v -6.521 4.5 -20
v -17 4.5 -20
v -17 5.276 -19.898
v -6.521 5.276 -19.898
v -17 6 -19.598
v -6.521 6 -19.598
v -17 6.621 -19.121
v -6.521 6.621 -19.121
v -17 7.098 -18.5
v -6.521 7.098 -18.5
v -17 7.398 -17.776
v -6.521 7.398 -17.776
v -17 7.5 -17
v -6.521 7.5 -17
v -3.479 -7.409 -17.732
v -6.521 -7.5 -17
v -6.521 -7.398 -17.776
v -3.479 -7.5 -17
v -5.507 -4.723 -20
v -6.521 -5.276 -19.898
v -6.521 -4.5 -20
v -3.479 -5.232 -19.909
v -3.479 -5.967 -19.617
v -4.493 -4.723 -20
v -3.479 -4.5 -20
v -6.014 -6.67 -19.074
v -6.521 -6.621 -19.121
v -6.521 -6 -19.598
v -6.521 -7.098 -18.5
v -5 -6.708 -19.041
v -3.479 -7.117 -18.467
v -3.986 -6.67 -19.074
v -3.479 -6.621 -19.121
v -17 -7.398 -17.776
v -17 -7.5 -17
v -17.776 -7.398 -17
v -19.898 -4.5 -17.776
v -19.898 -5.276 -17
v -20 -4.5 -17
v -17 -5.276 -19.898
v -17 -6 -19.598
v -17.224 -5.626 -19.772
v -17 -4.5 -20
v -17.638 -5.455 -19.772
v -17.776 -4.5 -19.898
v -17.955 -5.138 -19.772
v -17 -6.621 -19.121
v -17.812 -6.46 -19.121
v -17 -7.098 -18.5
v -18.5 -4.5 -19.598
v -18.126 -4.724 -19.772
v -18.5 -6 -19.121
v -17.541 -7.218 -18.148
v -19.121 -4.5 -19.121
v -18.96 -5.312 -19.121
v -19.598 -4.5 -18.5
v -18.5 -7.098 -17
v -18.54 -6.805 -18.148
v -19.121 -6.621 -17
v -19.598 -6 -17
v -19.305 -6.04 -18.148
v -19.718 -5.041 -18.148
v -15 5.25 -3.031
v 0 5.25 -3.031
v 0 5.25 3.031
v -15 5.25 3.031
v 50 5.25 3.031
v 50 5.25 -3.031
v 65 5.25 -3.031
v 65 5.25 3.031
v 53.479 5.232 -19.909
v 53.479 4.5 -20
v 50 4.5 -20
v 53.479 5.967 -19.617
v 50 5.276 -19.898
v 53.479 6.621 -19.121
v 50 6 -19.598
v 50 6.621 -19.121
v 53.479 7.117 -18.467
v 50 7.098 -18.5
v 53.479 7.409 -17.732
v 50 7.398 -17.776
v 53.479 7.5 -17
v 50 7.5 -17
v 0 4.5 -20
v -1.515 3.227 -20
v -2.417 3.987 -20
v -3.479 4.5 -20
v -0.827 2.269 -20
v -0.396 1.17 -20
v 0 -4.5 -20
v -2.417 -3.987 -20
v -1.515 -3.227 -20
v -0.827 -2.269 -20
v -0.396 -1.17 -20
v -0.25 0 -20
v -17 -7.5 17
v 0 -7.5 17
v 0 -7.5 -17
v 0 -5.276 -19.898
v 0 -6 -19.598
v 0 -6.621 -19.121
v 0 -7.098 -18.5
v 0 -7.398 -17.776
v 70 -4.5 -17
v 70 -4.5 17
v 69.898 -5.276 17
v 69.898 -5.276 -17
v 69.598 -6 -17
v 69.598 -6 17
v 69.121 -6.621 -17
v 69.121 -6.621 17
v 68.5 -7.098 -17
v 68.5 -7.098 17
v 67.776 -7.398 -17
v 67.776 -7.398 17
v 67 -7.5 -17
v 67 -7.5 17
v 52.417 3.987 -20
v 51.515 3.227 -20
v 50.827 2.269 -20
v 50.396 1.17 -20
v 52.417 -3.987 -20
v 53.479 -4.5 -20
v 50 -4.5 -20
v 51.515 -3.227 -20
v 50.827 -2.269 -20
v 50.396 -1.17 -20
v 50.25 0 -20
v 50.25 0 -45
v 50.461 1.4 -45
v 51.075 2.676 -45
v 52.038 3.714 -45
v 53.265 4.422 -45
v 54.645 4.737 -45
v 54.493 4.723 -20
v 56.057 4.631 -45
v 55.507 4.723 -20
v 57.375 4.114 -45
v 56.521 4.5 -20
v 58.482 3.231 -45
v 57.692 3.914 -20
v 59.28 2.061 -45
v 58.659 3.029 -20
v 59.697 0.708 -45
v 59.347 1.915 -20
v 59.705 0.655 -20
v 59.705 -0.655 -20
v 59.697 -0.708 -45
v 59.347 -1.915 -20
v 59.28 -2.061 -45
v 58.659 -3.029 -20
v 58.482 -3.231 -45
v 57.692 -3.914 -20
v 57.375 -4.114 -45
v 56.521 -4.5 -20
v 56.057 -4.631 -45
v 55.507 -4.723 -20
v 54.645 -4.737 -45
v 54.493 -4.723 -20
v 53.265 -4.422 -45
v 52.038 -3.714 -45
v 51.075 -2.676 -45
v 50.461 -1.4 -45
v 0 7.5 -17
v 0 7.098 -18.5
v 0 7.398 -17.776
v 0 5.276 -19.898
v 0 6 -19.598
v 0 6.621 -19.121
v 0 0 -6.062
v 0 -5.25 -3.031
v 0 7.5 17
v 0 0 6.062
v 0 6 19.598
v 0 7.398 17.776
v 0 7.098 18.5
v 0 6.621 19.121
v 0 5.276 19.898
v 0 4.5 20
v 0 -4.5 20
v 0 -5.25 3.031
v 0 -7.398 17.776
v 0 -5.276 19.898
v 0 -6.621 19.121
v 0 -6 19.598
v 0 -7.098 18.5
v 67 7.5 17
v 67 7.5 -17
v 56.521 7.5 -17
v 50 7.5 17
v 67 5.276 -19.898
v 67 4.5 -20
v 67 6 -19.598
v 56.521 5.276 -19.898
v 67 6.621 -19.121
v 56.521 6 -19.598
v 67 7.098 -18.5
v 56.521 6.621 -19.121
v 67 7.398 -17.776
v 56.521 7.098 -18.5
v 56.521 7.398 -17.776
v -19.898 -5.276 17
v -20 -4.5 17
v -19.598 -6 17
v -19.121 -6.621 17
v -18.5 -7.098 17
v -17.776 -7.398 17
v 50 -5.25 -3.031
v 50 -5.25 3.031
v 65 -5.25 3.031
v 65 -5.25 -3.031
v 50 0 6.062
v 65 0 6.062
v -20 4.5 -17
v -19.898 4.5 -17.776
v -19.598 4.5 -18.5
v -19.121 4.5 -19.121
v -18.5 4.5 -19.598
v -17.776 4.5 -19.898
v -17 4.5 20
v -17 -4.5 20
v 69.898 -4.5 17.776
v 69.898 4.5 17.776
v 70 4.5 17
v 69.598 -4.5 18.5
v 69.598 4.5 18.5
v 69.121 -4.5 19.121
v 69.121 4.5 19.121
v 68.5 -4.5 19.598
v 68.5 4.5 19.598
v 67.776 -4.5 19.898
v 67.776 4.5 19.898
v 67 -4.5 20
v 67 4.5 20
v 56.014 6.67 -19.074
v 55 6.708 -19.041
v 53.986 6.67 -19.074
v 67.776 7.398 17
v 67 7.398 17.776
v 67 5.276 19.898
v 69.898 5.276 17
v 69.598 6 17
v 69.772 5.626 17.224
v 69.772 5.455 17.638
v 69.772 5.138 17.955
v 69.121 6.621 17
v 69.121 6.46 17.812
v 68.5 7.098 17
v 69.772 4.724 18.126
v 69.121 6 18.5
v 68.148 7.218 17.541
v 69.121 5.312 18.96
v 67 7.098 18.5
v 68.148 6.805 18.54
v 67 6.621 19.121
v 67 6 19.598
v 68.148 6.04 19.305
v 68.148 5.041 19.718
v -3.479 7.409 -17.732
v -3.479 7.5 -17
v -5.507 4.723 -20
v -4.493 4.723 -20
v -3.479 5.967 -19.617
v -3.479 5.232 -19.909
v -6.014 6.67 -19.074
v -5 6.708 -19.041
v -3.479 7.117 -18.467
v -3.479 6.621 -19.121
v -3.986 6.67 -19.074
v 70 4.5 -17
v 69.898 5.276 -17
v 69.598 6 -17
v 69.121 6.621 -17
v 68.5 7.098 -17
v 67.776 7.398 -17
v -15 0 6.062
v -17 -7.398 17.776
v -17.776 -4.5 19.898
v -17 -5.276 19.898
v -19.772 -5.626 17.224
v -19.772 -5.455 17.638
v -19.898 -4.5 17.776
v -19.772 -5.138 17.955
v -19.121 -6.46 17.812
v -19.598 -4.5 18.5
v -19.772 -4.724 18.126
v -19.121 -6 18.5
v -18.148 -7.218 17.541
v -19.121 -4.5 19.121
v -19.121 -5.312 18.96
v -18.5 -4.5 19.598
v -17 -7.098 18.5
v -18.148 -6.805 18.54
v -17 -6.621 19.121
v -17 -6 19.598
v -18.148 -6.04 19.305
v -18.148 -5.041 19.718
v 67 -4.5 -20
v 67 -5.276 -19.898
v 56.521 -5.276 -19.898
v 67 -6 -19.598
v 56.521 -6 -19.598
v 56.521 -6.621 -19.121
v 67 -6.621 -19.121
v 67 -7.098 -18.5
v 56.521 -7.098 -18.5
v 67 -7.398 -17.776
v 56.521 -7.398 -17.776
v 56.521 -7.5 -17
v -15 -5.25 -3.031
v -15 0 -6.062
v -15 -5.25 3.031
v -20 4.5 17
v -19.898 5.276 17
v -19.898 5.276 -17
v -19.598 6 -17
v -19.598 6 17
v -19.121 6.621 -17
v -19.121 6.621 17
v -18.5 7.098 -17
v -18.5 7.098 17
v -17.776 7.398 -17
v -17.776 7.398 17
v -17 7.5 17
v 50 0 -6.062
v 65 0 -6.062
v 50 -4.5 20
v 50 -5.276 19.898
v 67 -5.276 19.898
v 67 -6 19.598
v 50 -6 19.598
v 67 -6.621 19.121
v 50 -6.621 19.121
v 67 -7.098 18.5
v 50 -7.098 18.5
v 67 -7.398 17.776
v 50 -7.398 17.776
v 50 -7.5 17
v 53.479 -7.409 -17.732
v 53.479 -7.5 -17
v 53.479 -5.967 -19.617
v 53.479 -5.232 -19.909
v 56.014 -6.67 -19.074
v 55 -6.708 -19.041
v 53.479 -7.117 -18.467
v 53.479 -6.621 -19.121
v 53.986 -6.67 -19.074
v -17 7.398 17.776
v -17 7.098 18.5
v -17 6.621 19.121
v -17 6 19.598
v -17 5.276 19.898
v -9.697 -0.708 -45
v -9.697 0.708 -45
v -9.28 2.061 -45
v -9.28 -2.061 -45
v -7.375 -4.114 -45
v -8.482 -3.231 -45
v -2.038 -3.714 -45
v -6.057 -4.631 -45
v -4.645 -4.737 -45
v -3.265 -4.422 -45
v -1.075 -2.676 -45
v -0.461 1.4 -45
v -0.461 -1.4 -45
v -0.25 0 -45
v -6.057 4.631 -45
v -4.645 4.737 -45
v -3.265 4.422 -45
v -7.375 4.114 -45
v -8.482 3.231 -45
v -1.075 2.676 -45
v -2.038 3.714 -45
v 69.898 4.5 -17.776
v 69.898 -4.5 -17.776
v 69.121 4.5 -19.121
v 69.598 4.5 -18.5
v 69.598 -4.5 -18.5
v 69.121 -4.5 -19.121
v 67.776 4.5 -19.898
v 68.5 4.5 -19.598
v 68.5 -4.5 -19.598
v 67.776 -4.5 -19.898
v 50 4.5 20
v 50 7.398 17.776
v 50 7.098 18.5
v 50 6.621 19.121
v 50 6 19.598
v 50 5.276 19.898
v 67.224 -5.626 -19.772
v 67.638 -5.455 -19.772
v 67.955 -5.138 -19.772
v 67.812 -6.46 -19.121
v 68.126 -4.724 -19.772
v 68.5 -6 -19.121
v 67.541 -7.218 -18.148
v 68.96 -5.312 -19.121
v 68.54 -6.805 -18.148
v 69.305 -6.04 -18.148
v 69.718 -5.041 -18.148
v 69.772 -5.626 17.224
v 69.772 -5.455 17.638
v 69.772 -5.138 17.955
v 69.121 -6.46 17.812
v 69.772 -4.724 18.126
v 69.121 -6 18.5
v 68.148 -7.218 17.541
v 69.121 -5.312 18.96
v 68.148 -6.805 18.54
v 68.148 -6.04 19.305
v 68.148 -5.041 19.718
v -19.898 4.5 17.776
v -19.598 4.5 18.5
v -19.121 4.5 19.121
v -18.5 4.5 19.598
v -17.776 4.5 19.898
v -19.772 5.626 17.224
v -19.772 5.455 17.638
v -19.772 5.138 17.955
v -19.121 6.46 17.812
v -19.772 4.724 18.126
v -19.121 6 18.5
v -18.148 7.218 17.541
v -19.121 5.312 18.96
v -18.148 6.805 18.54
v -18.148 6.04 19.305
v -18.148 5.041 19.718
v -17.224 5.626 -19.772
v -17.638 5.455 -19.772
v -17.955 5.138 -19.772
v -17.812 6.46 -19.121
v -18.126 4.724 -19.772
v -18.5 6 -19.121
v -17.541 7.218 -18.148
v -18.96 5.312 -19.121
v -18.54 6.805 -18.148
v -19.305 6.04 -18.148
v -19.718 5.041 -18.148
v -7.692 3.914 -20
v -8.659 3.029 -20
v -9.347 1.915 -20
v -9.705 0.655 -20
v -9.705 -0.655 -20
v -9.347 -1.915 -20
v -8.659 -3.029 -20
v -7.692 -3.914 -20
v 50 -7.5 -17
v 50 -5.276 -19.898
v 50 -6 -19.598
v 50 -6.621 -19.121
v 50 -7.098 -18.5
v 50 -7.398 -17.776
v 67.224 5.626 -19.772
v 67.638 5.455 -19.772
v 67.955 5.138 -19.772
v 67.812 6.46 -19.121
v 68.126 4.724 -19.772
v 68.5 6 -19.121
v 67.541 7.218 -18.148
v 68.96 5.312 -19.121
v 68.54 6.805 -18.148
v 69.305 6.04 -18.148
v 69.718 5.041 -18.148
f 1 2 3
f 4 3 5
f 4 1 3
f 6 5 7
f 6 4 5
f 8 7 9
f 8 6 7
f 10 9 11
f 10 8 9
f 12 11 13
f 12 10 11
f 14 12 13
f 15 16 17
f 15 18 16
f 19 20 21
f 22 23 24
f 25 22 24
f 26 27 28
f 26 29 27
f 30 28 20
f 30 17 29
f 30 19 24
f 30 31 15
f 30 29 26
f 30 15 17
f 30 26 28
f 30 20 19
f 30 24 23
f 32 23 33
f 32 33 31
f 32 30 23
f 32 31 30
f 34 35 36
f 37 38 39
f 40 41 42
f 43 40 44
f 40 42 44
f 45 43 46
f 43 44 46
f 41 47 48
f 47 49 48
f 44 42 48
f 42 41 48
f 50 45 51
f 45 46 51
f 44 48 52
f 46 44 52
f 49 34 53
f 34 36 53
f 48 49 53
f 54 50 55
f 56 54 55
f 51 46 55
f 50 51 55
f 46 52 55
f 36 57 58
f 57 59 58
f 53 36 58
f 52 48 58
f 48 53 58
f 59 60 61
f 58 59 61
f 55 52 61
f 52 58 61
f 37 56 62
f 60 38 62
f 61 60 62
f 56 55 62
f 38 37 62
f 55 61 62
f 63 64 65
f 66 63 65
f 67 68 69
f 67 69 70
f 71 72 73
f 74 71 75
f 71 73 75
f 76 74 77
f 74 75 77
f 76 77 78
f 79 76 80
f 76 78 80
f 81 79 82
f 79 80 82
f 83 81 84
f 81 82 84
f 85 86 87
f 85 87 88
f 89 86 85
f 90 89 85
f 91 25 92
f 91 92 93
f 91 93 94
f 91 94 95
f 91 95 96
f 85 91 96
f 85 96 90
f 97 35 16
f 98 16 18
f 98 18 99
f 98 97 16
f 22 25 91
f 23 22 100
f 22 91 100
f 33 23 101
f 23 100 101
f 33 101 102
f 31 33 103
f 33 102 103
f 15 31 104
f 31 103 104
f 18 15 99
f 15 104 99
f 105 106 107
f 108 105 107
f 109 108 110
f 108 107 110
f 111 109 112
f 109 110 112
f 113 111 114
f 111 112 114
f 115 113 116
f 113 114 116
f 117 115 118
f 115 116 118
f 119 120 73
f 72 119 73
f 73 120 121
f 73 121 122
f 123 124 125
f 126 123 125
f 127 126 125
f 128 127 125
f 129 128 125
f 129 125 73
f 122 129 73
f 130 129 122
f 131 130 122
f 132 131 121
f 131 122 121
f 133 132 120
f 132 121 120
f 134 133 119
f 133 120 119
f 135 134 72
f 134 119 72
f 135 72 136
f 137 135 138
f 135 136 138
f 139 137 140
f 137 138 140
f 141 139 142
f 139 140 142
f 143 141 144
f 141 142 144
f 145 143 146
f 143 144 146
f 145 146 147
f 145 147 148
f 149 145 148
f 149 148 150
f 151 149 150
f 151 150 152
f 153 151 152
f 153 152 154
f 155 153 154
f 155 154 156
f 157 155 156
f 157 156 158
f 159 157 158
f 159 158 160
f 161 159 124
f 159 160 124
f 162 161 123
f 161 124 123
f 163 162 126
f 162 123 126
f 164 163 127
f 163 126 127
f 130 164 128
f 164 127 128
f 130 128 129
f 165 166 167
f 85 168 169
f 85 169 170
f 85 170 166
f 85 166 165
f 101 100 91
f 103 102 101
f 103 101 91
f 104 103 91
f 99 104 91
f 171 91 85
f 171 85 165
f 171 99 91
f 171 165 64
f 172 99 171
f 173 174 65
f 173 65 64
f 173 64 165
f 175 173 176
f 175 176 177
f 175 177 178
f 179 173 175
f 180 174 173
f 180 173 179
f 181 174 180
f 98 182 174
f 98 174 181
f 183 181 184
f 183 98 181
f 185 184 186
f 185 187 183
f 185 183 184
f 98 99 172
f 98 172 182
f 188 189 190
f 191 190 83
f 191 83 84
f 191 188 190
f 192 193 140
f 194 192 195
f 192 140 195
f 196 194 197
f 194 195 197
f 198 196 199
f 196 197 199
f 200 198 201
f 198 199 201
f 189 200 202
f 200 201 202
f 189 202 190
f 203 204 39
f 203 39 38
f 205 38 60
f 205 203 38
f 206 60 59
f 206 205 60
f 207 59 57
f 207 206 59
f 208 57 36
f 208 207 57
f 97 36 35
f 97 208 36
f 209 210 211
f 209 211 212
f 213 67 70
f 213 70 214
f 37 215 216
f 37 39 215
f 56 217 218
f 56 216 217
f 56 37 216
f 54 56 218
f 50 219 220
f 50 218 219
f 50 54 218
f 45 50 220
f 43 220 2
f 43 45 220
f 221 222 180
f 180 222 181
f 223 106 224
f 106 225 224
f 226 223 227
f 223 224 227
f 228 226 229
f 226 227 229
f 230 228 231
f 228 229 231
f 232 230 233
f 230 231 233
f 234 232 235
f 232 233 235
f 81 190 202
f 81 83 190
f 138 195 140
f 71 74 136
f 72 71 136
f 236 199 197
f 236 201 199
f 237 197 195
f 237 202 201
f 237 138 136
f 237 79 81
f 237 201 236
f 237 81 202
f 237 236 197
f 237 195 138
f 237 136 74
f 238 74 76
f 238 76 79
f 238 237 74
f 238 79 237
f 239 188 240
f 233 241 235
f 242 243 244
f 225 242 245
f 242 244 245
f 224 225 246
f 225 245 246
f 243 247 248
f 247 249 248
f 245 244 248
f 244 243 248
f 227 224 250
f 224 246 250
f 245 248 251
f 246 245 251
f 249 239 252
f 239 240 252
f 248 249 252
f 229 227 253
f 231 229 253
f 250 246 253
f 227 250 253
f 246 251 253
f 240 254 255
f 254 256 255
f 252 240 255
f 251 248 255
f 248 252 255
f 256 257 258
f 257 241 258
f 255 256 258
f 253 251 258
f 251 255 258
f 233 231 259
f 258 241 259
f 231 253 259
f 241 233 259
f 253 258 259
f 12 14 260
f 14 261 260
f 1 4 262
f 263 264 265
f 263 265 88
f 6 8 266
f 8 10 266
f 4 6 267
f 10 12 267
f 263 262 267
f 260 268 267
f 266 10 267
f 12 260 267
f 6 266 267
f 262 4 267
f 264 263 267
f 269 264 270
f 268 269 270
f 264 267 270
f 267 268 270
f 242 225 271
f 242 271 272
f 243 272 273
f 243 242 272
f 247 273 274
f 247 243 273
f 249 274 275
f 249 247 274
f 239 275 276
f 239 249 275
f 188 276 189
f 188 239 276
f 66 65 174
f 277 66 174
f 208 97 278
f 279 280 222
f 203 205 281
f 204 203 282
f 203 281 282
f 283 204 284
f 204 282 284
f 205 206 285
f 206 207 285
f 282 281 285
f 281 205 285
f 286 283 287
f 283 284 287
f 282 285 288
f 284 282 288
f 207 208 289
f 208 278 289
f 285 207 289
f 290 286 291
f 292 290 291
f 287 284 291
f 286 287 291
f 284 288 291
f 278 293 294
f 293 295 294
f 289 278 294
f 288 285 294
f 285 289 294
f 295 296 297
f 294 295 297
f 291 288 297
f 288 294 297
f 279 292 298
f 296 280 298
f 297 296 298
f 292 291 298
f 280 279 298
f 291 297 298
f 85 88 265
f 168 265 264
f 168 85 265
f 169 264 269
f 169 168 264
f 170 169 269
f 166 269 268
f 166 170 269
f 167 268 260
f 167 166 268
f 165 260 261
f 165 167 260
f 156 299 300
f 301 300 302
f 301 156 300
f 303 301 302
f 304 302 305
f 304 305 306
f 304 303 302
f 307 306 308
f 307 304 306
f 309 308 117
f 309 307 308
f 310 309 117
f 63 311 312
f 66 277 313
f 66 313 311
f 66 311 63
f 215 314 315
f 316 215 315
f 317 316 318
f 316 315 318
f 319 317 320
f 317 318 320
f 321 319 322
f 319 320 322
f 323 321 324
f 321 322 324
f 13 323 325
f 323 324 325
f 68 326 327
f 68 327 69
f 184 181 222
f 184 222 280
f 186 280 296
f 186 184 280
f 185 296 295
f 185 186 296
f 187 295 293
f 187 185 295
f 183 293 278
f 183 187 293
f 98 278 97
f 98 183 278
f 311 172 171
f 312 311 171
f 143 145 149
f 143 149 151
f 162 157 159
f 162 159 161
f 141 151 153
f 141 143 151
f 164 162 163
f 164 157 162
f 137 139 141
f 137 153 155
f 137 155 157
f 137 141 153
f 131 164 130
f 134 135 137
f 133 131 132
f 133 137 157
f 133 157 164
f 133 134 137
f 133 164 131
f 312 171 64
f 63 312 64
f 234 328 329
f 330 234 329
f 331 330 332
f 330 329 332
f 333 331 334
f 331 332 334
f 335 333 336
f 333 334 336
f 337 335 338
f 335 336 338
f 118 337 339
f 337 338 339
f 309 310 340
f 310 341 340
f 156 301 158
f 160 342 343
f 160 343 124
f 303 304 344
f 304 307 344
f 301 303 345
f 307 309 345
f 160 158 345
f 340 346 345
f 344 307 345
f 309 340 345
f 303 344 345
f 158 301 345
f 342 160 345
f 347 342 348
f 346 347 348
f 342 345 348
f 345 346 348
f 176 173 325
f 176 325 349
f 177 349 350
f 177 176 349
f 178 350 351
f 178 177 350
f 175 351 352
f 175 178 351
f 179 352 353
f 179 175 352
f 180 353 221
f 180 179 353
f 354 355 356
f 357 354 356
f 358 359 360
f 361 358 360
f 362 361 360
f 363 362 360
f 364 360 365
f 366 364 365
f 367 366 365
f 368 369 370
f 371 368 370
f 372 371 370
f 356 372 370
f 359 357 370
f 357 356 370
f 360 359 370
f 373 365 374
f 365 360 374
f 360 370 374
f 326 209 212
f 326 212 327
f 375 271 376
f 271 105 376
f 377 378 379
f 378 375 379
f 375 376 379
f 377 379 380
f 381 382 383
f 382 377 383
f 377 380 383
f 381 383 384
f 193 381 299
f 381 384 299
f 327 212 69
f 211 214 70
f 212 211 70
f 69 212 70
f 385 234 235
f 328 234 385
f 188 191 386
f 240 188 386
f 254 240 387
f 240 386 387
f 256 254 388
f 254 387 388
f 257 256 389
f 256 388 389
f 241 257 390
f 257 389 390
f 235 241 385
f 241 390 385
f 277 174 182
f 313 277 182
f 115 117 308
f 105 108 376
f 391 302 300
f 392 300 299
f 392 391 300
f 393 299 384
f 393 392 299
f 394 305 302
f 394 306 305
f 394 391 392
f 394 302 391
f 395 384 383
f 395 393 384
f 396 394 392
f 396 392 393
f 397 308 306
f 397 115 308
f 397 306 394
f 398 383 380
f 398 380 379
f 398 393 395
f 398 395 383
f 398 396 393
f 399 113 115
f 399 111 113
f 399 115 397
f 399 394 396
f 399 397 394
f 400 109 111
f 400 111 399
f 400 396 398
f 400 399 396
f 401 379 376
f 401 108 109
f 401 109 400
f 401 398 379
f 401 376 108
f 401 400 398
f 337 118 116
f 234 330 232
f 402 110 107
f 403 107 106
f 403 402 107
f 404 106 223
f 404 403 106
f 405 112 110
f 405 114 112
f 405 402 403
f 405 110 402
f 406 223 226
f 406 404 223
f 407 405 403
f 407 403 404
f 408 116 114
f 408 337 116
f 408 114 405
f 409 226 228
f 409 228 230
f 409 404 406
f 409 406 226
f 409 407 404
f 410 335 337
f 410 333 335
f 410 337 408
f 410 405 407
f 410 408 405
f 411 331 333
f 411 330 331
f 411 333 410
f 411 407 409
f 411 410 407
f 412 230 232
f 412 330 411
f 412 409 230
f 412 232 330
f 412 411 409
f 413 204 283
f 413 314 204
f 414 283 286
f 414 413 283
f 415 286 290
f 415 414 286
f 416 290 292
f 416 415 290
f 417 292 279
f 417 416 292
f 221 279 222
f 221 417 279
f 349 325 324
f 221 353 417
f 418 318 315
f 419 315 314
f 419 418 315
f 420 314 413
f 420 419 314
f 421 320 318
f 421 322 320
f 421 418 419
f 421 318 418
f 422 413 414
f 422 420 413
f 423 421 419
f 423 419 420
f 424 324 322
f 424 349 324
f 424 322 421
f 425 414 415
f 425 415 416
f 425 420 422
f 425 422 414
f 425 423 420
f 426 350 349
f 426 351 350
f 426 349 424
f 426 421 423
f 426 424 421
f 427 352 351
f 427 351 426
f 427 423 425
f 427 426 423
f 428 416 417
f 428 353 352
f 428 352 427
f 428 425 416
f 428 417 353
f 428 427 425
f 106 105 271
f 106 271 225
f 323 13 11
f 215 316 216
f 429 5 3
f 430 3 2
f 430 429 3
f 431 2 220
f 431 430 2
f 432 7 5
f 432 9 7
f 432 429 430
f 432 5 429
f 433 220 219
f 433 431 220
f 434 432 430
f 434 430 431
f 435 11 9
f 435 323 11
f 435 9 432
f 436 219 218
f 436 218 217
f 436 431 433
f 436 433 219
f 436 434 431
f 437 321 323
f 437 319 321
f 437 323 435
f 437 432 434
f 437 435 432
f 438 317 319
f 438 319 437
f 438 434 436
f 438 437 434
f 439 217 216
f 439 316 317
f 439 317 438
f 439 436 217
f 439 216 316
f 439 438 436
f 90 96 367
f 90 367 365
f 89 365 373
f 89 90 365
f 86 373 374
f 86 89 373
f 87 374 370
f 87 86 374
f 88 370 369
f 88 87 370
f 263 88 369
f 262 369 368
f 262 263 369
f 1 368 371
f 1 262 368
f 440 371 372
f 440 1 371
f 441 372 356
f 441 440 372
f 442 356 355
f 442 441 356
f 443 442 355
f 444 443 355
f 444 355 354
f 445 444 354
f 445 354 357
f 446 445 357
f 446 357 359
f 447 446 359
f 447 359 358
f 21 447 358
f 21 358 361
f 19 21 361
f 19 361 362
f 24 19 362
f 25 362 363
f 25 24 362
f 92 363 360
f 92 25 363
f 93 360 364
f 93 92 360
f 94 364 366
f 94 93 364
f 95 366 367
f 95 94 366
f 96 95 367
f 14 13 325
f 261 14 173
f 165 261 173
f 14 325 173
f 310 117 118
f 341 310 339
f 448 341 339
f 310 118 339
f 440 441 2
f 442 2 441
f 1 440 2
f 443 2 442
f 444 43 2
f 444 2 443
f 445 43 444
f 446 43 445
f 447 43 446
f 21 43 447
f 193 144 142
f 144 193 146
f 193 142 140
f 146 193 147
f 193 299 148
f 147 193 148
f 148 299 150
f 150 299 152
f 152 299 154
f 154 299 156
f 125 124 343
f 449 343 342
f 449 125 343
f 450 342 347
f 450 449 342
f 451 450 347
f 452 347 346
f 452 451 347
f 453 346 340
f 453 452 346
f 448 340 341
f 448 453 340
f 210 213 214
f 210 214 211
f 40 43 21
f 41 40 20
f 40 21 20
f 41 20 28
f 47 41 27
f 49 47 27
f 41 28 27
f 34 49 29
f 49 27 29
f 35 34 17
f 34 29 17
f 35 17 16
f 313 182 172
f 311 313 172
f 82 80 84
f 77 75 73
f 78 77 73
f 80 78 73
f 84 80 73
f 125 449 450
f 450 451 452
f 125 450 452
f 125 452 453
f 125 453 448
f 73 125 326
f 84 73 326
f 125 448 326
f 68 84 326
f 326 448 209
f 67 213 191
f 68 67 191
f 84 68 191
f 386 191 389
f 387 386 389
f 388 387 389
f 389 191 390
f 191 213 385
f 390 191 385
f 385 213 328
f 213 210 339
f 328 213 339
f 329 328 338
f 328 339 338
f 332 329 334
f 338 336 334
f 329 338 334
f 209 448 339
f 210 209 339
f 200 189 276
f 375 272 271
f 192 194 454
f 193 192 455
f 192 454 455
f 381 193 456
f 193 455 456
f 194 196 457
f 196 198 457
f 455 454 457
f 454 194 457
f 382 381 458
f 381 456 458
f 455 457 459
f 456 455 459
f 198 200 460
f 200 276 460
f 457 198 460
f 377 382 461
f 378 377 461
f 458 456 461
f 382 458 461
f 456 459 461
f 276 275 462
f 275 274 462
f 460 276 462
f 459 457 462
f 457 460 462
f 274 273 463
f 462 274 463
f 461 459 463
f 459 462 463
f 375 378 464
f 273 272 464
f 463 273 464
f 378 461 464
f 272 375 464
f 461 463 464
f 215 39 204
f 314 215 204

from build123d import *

# Parameters (mm, degrees)
F0_W     = 20
F0_H     = 40
F1_DEPTH = 7.5
F3_DEPTH = 15
F5_R     = 4.75
F6_DEPTH = 25
F7_R     = 3


with BuildPart() as f1:
    # F0 (on Front) → F1 (new body, symmetric)
    with BuildSketch(Plane.XZ):
        with Locations((-10, 0)):
            Rectangle(F0_W, F0_H)
    extrude(amount=F1_DEPTH, both=True)

    # F2 (on Right) → F3 (cut)
    with BuildSketch(Plane.YZ):
        Polygon((0, -6.062178), (5.25, -3.031089), (5.25, 3.031089), (0, 6.062178), (-5.25, 3.031089), (-5.25, -3.031089), align=None)
    extrude(amount=-F3_DEPTH, mode=Mode.SUBTRACT)

    # F5 (on offset) → F6 (join)
    with BuildSketch(Plane.XY.offset(-20)):
        with Locations((-5, 0)):
            Circle(F5_R)
    extrude(amount=-F6_DEPTH)

    # F7
    f7_edges = [f1.edges().sort_by_distance(p)[0] for p in [
        (-10, -7.5, 20),
        (-10, 7.5, 20),
        (-20, -7.5, 0),
        (-20, 7.5, 0),
        (-20, 0, 20),
        (-10, 7.5, -20),
        (-10, -7.5, -20),
        (-20, 0, -20),
    ]]
    fillet(f7_edges, radius=F7_R)


with BuildPart() as f9_1:
    # F9: instance of F1
    add(f1.part.mirror(Plane.YZ.offset(25)))


solid = Compound([f1.part, f9_1.part])
